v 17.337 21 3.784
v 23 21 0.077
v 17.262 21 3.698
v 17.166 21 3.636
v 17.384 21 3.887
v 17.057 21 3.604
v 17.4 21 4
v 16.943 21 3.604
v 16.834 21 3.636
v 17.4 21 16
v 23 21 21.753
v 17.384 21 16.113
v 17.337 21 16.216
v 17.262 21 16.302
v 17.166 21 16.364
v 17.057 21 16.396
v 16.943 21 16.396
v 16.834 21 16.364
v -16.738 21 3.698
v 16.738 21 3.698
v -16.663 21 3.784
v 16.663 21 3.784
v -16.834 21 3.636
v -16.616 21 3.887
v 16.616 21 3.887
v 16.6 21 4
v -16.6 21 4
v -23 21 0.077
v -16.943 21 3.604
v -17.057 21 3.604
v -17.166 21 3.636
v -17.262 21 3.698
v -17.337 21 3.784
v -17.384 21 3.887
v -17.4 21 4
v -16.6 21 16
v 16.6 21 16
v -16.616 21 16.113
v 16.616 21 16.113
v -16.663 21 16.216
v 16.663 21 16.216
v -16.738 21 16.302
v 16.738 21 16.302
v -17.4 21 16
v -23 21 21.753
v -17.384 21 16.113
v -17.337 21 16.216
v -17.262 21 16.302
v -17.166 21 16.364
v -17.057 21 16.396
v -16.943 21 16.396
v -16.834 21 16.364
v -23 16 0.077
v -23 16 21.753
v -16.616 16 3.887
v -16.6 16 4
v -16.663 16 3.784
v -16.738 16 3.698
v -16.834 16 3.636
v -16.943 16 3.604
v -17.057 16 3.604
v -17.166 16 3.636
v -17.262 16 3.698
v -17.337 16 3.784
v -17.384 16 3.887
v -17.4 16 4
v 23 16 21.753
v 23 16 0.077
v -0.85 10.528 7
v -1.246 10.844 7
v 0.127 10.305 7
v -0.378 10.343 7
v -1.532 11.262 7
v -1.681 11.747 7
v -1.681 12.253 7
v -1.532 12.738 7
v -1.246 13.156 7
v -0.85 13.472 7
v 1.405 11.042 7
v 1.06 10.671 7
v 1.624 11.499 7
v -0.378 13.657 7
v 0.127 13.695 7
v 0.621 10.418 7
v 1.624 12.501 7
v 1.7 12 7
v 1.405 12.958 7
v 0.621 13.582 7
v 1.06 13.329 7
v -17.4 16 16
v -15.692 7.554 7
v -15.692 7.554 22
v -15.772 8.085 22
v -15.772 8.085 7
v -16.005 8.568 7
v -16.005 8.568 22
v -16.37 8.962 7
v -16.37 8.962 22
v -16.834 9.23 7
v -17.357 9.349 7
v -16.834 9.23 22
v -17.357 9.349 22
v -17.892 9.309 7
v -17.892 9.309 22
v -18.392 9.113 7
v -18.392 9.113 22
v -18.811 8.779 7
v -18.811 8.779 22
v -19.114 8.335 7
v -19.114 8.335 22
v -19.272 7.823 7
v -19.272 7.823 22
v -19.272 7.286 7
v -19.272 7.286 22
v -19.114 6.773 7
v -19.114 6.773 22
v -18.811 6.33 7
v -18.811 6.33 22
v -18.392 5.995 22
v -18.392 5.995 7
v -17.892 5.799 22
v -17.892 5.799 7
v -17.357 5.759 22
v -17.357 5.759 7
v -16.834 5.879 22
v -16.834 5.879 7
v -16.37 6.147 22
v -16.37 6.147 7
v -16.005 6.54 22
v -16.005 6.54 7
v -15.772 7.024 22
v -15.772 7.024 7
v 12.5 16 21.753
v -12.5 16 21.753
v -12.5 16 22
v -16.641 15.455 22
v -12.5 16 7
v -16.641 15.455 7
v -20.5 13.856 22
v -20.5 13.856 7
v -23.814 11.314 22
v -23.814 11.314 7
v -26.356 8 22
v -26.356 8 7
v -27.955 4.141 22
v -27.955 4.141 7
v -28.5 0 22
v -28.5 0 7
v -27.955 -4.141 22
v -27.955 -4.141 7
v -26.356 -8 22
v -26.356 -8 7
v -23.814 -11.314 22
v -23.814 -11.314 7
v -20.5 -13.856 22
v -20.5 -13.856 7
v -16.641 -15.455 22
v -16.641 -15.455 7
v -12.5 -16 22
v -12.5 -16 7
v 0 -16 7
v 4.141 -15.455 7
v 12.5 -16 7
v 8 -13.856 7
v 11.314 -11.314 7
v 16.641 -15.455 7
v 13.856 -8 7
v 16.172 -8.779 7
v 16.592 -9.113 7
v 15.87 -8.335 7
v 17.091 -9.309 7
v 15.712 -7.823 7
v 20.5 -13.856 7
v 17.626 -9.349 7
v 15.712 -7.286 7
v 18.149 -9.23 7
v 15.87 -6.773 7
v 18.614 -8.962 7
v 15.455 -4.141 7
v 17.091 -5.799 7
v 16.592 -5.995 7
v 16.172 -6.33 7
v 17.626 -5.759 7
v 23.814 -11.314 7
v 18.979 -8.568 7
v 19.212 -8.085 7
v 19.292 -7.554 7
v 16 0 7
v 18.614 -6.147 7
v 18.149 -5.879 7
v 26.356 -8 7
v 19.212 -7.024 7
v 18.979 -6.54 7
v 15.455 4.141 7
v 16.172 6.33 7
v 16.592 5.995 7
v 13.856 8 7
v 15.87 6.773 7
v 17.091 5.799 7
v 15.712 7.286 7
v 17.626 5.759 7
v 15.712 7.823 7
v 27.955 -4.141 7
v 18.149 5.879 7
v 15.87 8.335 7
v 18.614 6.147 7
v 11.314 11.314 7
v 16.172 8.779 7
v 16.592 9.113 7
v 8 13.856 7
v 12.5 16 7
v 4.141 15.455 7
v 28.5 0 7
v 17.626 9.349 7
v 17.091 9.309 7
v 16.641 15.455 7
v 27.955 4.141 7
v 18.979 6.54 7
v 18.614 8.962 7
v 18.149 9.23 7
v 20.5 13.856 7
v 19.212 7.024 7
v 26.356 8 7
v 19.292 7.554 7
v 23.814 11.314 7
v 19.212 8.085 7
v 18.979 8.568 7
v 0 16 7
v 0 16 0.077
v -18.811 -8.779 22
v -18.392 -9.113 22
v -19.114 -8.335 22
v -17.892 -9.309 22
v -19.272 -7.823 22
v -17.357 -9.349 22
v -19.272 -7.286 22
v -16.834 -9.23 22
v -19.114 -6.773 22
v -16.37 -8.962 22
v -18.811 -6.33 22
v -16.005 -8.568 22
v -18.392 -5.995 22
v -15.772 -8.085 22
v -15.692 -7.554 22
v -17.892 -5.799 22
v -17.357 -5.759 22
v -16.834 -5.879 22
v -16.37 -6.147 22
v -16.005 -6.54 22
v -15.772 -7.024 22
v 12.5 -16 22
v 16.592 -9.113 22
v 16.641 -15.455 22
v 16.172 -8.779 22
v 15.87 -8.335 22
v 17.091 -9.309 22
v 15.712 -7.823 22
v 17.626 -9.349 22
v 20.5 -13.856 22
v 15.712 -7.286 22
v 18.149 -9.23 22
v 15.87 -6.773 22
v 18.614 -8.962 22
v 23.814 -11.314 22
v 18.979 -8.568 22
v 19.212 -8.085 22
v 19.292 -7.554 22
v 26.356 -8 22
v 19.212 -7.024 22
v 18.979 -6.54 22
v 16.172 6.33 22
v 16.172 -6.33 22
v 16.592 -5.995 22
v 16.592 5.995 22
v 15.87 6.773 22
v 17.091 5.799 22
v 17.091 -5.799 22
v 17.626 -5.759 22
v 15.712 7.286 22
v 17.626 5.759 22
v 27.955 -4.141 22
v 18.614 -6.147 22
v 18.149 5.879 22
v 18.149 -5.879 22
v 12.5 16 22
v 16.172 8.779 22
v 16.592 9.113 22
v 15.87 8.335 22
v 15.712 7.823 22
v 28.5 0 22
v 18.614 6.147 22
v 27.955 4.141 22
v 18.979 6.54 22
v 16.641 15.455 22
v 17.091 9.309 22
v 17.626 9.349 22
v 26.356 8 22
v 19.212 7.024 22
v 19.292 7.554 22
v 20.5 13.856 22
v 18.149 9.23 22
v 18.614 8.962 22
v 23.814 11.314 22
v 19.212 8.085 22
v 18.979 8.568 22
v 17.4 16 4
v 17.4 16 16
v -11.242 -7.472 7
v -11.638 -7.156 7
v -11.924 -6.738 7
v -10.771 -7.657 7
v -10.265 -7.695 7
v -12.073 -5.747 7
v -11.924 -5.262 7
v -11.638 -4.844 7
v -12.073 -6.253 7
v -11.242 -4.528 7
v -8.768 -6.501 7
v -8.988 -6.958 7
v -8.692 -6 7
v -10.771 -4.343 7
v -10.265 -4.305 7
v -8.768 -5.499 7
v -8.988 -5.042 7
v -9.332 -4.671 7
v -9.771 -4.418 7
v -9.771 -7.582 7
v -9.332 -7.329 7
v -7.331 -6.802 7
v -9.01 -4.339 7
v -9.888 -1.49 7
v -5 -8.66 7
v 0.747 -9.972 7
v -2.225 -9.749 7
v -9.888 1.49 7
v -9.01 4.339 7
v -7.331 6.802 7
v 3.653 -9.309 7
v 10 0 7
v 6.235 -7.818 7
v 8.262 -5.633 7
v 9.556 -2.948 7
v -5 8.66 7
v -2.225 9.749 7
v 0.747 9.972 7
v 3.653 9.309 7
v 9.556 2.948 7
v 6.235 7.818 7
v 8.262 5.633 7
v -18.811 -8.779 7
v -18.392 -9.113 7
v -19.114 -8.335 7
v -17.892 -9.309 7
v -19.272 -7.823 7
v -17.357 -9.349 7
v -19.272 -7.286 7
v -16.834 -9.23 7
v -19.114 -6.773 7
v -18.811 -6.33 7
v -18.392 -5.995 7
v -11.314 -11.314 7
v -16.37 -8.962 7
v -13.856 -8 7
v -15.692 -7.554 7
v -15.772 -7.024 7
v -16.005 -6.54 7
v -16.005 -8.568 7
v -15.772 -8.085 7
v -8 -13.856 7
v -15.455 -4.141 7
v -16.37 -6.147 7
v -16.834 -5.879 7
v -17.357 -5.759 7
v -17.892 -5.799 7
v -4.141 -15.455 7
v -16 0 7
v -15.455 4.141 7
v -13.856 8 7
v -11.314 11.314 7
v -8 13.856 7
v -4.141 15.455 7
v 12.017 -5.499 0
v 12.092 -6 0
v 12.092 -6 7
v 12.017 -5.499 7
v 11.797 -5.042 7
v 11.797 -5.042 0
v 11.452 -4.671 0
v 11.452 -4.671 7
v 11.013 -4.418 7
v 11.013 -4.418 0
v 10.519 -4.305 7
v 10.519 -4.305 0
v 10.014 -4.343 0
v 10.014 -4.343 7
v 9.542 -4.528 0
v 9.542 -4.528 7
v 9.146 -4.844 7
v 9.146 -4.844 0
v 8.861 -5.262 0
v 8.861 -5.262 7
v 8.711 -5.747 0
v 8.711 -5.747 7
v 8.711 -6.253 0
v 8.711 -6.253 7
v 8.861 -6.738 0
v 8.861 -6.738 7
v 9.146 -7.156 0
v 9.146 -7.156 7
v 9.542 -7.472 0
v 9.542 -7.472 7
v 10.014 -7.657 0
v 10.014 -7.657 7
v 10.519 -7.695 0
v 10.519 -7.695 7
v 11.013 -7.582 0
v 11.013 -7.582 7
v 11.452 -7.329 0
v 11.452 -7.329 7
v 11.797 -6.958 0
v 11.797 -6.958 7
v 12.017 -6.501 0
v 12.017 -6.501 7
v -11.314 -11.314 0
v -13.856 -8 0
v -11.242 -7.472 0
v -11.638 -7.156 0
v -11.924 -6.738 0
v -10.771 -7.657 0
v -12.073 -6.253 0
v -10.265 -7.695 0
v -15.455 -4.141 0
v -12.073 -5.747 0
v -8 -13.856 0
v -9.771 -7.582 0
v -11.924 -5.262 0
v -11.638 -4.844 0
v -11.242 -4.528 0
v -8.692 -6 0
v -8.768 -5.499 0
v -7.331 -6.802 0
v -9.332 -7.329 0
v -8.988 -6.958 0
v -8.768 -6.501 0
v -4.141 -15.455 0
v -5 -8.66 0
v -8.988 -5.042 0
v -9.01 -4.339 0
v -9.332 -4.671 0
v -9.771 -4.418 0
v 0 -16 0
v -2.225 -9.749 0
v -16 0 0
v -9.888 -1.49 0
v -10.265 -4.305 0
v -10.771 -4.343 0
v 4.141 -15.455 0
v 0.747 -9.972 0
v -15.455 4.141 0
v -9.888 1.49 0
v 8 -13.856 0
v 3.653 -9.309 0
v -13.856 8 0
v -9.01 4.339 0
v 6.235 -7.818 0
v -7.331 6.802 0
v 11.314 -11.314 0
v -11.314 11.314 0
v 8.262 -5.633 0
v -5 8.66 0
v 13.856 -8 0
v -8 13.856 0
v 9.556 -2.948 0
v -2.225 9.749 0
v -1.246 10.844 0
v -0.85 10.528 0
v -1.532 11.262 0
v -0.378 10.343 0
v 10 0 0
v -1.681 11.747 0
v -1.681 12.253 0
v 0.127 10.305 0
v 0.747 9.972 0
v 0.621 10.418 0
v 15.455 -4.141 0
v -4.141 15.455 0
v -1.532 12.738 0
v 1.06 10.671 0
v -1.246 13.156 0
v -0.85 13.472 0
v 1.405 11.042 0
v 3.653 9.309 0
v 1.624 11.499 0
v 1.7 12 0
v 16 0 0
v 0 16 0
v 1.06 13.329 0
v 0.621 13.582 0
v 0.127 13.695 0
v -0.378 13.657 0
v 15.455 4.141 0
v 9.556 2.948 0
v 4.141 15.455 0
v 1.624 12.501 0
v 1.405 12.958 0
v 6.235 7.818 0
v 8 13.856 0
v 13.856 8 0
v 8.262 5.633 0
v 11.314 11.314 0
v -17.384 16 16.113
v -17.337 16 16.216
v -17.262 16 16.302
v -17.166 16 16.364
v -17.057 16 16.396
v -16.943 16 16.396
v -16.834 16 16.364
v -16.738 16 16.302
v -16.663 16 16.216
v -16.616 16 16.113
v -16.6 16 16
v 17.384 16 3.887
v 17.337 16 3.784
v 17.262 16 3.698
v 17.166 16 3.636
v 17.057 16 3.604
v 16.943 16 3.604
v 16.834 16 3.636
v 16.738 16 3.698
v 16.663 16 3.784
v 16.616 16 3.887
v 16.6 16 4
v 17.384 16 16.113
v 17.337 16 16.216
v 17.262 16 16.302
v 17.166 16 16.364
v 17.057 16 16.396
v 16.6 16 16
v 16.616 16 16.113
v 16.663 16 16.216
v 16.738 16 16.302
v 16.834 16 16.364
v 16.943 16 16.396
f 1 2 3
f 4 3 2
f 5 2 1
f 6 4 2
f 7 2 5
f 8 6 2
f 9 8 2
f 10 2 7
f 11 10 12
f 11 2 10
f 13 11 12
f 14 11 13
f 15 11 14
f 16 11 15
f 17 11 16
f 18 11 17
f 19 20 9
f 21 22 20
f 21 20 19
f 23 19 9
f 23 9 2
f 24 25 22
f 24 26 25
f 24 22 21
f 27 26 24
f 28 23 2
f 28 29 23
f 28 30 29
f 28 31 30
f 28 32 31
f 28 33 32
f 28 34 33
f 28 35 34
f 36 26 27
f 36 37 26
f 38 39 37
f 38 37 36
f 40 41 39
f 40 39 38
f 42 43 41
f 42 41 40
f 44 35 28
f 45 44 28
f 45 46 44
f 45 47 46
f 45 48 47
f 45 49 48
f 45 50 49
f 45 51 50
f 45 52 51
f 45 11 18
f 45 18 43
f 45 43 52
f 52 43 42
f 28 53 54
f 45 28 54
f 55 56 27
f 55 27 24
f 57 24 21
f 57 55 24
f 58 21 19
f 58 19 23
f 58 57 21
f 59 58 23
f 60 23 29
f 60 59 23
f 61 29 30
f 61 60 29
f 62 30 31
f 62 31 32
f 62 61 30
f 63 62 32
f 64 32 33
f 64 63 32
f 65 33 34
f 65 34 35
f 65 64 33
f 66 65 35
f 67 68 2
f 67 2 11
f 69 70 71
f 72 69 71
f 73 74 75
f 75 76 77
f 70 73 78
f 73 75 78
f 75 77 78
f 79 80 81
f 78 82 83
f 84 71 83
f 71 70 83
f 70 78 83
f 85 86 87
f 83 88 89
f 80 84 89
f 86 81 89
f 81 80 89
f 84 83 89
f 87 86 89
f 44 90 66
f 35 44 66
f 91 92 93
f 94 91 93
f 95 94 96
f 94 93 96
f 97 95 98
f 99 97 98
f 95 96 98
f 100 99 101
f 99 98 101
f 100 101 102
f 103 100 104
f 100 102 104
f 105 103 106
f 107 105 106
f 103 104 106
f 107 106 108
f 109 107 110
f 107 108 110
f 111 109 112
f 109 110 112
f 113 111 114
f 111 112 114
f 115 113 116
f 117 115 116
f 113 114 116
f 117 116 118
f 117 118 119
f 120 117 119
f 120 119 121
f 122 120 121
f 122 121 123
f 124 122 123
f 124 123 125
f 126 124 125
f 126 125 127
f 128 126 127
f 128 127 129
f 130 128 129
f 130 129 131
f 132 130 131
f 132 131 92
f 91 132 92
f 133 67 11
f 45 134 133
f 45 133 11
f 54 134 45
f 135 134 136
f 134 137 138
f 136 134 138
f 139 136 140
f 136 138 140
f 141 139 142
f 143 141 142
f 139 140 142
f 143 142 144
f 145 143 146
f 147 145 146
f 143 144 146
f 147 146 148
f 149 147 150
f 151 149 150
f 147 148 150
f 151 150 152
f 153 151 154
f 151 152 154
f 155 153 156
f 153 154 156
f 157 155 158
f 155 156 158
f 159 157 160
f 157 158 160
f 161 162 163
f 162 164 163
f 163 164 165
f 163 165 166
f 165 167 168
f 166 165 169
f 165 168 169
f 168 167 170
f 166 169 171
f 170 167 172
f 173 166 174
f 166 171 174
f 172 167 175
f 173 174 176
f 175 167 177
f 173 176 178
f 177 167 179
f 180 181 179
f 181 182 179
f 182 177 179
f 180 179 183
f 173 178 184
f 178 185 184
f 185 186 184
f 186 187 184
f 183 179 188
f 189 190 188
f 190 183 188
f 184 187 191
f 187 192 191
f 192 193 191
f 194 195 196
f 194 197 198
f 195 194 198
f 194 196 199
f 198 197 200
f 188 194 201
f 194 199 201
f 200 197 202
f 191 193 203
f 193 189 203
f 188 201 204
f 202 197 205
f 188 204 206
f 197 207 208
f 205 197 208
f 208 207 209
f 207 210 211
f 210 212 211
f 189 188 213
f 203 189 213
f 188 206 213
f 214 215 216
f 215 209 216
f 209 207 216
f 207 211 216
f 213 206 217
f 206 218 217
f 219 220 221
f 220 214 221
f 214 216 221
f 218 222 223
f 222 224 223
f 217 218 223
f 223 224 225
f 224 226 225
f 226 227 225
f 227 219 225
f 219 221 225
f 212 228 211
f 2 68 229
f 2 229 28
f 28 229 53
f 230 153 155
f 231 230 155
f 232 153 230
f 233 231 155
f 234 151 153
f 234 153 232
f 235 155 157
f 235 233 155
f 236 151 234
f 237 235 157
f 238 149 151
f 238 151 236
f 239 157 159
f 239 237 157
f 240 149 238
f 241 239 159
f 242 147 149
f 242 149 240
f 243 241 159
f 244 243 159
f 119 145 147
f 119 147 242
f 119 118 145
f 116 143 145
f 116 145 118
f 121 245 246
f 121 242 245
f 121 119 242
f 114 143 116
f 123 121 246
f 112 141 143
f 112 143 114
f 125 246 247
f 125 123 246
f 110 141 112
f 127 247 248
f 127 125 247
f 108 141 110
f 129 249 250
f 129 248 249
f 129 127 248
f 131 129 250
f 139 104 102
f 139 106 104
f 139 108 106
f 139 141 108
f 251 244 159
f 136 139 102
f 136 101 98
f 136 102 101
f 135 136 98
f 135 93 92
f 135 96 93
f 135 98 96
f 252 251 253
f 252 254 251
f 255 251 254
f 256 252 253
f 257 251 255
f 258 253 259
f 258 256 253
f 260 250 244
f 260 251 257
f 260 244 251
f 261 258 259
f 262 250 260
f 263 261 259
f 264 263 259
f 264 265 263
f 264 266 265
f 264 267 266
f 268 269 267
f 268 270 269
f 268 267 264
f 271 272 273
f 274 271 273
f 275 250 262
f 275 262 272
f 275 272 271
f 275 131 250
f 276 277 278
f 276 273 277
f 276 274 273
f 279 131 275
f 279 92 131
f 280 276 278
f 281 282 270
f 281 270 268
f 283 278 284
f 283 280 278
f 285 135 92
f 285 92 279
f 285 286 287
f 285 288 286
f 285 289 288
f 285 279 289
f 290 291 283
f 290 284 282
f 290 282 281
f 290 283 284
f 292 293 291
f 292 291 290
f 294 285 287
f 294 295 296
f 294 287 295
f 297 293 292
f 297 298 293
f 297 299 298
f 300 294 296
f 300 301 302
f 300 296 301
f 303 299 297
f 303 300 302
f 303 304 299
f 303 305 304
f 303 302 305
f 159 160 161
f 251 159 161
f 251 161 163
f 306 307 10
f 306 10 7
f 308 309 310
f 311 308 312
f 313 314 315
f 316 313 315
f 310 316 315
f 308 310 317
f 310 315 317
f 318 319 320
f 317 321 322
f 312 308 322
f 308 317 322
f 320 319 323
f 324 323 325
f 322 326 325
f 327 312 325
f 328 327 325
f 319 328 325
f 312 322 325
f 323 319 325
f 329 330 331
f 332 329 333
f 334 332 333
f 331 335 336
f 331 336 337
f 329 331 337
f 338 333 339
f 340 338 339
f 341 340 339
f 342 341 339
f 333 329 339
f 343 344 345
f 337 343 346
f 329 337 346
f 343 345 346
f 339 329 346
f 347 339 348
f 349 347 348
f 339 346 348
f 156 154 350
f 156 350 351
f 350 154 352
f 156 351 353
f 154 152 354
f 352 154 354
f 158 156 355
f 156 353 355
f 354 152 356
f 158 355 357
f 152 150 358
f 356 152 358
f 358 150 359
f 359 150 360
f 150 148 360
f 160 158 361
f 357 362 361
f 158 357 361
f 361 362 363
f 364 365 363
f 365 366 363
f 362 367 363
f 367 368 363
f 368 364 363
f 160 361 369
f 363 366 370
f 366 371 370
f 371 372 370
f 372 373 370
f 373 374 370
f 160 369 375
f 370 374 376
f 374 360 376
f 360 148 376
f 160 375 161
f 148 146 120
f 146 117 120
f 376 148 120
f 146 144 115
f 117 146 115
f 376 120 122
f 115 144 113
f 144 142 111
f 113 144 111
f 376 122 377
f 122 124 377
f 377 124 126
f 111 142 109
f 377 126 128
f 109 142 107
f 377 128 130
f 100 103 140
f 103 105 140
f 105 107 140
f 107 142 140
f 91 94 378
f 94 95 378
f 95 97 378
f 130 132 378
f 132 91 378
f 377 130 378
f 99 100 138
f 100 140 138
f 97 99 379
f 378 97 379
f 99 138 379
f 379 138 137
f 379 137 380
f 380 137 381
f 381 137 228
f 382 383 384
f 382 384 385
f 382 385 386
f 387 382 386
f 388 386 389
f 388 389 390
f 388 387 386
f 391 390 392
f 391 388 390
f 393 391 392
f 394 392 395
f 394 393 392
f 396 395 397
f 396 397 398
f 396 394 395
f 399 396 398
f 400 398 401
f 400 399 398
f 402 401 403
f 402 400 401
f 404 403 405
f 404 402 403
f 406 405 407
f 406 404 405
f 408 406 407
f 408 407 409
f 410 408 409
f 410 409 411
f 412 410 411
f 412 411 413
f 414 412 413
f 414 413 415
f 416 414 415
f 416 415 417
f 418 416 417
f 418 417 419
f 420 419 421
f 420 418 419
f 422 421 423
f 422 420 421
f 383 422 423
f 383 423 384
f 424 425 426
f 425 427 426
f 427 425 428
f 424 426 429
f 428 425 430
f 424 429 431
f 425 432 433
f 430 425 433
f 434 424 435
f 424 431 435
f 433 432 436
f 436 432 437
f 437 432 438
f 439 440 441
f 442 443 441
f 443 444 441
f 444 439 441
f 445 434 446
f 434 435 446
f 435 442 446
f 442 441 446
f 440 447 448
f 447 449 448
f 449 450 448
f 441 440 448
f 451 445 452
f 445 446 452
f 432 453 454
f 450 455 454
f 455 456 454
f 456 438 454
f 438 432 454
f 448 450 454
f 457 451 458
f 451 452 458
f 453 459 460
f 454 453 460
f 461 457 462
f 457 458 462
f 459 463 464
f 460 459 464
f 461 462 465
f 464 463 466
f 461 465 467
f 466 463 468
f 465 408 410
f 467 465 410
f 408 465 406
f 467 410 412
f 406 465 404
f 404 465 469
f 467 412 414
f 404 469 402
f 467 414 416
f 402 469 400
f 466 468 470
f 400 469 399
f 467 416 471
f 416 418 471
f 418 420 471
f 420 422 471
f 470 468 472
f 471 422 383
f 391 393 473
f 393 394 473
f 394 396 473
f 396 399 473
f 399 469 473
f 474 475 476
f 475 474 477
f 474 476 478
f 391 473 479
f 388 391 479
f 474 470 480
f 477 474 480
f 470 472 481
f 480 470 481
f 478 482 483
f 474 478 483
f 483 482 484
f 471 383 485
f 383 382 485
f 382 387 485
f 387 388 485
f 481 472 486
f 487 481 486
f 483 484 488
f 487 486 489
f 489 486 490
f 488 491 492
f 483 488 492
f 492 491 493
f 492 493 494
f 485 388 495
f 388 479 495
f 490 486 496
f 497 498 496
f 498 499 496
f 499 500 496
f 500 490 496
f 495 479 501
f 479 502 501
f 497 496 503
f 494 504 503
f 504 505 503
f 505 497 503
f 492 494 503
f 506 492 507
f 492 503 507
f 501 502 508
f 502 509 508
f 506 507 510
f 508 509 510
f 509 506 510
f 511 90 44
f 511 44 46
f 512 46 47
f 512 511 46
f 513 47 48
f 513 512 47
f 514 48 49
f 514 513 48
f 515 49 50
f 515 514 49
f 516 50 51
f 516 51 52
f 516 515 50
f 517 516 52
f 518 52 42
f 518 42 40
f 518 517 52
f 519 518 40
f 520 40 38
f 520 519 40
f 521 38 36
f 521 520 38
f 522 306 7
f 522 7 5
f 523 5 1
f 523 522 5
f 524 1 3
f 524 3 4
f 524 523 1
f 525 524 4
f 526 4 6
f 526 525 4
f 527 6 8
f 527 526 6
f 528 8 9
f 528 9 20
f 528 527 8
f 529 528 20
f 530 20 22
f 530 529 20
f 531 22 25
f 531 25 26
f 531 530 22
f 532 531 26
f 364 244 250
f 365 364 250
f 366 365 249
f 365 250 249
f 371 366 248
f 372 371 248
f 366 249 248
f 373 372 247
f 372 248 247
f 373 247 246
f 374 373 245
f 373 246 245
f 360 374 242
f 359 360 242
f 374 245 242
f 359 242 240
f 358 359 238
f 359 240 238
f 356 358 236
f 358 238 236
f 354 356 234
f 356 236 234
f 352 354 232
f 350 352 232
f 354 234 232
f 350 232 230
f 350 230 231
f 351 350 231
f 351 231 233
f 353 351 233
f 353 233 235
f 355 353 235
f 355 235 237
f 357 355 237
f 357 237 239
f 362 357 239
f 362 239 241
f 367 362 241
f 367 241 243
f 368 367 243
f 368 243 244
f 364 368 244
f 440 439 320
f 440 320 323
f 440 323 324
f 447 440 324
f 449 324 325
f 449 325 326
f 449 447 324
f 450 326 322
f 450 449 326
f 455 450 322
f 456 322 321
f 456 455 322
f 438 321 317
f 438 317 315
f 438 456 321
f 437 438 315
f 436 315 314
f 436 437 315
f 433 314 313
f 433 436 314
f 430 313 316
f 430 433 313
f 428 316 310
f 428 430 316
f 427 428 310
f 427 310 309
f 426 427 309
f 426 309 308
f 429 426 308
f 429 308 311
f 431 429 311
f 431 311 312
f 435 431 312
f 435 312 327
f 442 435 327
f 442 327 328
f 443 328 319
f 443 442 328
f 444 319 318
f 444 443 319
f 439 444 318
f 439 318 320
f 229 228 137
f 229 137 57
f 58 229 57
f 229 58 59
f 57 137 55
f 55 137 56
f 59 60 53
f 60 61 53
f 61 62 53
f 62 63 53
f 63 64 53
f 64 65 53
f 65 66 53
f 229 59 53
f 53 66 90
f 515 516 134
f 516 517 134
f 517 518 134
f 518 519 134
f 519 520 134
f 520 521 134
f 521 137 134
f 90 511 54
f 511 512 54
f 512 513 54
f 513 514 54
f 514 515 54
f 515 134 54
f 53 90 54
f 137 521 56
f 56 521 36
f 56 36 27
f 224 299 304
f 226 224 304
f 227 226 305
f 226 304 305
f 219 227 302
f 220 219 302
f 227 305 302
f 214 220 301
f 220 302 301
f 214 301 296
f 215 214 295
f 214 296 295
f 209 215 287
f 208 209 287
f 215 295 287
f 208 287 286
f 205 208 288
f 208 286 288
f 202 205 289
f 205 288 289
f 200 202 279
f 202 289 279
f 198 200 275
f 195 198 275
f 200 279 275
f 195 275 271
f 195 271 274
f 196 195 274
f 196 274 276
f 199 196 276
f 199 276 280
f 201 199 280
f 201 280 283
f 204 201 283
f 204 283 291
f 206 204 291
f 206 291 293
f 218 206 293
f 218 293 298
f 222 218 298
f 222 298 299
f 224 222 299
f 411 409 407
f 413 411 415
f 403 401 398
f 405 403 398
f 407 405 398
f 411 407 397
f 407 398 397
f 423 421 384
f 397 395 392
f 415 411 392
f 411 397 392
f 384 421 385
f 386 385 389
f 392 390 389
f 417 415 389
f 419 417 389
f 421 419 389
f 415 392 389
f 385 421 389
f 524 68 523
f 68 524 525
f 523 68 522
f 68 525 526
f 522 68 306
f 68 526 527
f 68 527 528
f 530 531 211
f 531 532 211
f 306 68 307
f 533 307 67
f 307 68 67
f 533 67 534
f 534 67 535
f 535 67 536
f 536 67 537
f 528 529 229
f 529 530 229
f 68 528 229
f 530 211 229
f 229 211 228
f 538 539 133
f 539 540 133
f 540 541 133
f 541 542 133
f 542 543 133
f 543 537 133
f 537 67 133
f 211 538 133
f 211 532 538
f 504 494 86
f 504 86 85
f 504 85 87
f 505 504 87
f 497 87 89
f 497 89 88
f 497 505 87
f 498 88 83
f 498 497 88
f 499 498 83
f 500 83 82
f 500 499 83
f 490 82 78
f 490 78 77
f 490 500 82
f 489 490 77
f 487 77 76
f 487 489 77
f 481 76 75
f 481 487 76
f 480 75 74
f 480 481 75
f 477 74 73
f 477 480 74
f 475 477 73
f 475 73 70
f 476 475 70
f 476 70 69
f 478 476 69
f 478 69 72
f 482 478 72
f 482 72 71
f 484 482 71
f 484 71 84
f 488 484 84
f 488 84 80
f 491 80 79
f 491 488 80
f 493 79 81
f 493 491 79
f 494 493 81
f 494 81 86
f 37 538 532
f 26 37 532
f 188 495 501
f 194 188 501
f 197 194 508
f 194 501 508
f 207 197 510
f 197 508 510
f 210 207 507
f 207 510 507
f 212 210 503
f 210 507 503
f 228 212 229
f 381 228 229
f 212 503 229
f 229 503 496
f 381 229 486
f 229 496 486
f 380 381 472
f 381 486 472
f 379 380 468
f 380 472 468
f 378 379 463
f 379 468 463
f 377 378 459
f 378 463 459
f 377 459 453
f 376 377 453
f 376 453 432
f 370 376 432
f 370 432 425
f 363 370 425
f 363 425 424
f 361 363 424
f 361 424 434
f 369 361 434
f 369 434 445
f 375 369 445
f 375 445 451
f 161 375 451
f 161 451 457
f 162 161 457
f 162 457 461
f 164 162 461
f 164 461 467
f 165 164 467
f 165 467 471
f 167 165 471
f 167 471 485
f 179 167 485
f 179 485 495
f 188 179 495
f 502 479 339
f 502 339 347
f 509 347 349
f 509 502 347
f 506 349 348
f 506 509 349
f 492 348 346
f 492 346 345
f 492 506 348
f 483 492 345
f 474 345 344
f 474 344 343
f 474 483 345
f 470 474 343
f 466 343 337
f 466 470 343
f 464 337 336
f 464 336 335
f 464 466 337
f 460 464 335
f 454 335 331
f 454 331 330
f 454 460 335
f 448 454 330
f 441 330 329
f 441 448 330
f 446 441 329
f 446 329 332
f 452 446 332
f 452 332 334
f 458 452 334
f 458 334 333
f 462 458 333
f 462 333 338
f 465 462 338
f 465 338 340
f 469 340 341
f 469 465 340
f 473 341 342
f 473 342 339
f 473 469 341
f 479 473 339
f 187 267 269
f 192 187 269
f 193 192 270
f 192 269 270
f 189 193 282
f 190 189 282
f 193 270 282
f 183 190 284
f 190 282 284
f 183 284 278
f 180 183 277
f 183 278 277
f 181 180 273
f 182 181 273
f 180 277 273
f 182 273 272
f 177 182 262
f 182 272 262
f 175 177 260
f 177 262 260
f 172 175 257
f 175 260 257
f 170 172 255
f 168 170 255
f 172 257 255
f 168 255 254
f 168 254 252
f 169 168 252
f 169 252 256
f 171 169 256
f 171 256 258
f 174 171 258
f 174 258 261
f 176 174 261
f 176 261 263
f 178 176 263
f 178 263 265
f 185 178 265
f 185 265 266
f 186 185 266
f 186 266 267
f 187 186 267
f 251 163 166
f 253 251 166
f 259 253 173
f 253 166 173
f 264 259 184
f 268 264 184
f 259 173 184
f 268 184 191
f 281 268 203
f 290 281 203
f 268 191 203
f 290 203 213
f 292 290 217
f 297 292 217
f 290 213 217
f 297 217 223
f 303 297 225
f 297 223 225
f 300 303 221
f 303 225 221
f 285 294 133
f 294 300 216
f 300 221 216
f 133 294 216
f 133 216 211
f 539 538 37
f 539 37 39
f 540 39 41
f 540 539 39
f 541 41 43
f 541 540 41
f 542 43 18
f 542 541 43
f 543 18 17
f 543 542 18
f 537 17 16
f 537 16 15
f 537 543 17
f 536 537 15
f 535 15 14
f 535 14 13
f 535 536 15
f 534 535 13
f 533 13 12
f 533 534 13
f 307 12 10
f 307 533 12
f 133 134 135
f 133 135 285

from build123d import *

# Parameters (mm, degrees)
SKETCH029_R     = 16
SKETCH029_R_2   = 10
SKETCH029_R_3   = 1.7
PAD008_DEPTH    = 7
PAD009_DEPTH    = 15
SKETCH031_R     = 1.8
POCKET020_DEPTH = 30
SKETCH032_W     = 46
SKETCH032_H     = 21.675207
PAD010_DEPTH    = 5


with BuildPart() as part:
    # Sketch029 → Pad008 (new body)
    with BuildSketch(Plane.XY):
        Circle(SKETCH029_R)
        Circle(SKETCH029_R_2, mode=Mode.SUBTRACT)
        with Locations((0, 12)):
            Circle(SKETCH029_R_3, mode=Mode.SUBTRACT)
        with Locations((-10.392305, -6)):
            Circle(SKETCH029_R_3, mode=Mode.SUBTRACT)
        with Locations((10.392305, -6)):
            Circle(SKETCH029_R_3, mode=Mode.SUBTRACT)
    extrude(amount=PAD008_DEPTH)

    # Sketch030 (on Face7 of Pad008) → Pad009 (join)
    with BuildSketch(Plane.XY.offset(7)):
        with BuildLine():
            ThreePointArc((-12.5, 16), (-28.5, 0), (-12.5, -16))
            Line((-12.5, -16), (12.5, -16))
            ThreePointArc((12.5, -16), (28.5, 0), (12.5, 16))
            Line((-12.5, 16), (12.5, 16))
        make_face()
    extrude(amount=PAD009_DEPTH)

    # Sketch031 (on Face17 of Pad009) → Pocket020 (cut)
    with BuildSketch(Plane.XY.offset(22)):
        with Locations((-17.491838, 7.554306)):
            Circle(SKETCH031_R)
        with Locations((-17.491838, -7.554306)):
            Circle(SKETCH031_R)
        with Locations((17.491838, -7.554306)):
            Circle(SKETCH031_R)
        with Locations((17.491838, 7.554306)):
            Circle(SKETCH031_R)
    extrude(amount=-POCKET020_DEPTH, mode=Mode.SUBTRACT)

    # Sketch032 (on Face9 of Pocket020) → Pad010 (join)
    with BuildSketch(Plane(origin=(0, 16, 0), x_dir=(-1, 0, 0), z_dir=(0, 1, 0))):
        with Locations((0, 10.914934)):
            Rectangle(SKETCH032_W, SKETCH032_H)
        with BuildLine():
            ThreePointArc((-16.6, 16), (-17, 16.4), (-17.4, 16))
            Line((-17.4, 16), (-17.4, 4))
            ThreePointArc((-17.4, 4), (-17, 3.6), (-16.6, 4))
            Line((-16.6, 16), (-16.6, 4))
        make_face(mode=Mode.SUBTRACT)
        with BuildLine():
            ThreePointArc((17.4, 16), (17, 16.4), (16.6, 16))
            Line((16.6, 16), (16.6, 4))
            ThreePointArc((16.6, 4), (17, 3.6), (17.4, 4))
            Line((17.4, 16), (17.4, 4))
        make_face(mode=Mode.SUBTRACT)
    extrude(amount=PAD010_DEPTH)


solid = part.part
